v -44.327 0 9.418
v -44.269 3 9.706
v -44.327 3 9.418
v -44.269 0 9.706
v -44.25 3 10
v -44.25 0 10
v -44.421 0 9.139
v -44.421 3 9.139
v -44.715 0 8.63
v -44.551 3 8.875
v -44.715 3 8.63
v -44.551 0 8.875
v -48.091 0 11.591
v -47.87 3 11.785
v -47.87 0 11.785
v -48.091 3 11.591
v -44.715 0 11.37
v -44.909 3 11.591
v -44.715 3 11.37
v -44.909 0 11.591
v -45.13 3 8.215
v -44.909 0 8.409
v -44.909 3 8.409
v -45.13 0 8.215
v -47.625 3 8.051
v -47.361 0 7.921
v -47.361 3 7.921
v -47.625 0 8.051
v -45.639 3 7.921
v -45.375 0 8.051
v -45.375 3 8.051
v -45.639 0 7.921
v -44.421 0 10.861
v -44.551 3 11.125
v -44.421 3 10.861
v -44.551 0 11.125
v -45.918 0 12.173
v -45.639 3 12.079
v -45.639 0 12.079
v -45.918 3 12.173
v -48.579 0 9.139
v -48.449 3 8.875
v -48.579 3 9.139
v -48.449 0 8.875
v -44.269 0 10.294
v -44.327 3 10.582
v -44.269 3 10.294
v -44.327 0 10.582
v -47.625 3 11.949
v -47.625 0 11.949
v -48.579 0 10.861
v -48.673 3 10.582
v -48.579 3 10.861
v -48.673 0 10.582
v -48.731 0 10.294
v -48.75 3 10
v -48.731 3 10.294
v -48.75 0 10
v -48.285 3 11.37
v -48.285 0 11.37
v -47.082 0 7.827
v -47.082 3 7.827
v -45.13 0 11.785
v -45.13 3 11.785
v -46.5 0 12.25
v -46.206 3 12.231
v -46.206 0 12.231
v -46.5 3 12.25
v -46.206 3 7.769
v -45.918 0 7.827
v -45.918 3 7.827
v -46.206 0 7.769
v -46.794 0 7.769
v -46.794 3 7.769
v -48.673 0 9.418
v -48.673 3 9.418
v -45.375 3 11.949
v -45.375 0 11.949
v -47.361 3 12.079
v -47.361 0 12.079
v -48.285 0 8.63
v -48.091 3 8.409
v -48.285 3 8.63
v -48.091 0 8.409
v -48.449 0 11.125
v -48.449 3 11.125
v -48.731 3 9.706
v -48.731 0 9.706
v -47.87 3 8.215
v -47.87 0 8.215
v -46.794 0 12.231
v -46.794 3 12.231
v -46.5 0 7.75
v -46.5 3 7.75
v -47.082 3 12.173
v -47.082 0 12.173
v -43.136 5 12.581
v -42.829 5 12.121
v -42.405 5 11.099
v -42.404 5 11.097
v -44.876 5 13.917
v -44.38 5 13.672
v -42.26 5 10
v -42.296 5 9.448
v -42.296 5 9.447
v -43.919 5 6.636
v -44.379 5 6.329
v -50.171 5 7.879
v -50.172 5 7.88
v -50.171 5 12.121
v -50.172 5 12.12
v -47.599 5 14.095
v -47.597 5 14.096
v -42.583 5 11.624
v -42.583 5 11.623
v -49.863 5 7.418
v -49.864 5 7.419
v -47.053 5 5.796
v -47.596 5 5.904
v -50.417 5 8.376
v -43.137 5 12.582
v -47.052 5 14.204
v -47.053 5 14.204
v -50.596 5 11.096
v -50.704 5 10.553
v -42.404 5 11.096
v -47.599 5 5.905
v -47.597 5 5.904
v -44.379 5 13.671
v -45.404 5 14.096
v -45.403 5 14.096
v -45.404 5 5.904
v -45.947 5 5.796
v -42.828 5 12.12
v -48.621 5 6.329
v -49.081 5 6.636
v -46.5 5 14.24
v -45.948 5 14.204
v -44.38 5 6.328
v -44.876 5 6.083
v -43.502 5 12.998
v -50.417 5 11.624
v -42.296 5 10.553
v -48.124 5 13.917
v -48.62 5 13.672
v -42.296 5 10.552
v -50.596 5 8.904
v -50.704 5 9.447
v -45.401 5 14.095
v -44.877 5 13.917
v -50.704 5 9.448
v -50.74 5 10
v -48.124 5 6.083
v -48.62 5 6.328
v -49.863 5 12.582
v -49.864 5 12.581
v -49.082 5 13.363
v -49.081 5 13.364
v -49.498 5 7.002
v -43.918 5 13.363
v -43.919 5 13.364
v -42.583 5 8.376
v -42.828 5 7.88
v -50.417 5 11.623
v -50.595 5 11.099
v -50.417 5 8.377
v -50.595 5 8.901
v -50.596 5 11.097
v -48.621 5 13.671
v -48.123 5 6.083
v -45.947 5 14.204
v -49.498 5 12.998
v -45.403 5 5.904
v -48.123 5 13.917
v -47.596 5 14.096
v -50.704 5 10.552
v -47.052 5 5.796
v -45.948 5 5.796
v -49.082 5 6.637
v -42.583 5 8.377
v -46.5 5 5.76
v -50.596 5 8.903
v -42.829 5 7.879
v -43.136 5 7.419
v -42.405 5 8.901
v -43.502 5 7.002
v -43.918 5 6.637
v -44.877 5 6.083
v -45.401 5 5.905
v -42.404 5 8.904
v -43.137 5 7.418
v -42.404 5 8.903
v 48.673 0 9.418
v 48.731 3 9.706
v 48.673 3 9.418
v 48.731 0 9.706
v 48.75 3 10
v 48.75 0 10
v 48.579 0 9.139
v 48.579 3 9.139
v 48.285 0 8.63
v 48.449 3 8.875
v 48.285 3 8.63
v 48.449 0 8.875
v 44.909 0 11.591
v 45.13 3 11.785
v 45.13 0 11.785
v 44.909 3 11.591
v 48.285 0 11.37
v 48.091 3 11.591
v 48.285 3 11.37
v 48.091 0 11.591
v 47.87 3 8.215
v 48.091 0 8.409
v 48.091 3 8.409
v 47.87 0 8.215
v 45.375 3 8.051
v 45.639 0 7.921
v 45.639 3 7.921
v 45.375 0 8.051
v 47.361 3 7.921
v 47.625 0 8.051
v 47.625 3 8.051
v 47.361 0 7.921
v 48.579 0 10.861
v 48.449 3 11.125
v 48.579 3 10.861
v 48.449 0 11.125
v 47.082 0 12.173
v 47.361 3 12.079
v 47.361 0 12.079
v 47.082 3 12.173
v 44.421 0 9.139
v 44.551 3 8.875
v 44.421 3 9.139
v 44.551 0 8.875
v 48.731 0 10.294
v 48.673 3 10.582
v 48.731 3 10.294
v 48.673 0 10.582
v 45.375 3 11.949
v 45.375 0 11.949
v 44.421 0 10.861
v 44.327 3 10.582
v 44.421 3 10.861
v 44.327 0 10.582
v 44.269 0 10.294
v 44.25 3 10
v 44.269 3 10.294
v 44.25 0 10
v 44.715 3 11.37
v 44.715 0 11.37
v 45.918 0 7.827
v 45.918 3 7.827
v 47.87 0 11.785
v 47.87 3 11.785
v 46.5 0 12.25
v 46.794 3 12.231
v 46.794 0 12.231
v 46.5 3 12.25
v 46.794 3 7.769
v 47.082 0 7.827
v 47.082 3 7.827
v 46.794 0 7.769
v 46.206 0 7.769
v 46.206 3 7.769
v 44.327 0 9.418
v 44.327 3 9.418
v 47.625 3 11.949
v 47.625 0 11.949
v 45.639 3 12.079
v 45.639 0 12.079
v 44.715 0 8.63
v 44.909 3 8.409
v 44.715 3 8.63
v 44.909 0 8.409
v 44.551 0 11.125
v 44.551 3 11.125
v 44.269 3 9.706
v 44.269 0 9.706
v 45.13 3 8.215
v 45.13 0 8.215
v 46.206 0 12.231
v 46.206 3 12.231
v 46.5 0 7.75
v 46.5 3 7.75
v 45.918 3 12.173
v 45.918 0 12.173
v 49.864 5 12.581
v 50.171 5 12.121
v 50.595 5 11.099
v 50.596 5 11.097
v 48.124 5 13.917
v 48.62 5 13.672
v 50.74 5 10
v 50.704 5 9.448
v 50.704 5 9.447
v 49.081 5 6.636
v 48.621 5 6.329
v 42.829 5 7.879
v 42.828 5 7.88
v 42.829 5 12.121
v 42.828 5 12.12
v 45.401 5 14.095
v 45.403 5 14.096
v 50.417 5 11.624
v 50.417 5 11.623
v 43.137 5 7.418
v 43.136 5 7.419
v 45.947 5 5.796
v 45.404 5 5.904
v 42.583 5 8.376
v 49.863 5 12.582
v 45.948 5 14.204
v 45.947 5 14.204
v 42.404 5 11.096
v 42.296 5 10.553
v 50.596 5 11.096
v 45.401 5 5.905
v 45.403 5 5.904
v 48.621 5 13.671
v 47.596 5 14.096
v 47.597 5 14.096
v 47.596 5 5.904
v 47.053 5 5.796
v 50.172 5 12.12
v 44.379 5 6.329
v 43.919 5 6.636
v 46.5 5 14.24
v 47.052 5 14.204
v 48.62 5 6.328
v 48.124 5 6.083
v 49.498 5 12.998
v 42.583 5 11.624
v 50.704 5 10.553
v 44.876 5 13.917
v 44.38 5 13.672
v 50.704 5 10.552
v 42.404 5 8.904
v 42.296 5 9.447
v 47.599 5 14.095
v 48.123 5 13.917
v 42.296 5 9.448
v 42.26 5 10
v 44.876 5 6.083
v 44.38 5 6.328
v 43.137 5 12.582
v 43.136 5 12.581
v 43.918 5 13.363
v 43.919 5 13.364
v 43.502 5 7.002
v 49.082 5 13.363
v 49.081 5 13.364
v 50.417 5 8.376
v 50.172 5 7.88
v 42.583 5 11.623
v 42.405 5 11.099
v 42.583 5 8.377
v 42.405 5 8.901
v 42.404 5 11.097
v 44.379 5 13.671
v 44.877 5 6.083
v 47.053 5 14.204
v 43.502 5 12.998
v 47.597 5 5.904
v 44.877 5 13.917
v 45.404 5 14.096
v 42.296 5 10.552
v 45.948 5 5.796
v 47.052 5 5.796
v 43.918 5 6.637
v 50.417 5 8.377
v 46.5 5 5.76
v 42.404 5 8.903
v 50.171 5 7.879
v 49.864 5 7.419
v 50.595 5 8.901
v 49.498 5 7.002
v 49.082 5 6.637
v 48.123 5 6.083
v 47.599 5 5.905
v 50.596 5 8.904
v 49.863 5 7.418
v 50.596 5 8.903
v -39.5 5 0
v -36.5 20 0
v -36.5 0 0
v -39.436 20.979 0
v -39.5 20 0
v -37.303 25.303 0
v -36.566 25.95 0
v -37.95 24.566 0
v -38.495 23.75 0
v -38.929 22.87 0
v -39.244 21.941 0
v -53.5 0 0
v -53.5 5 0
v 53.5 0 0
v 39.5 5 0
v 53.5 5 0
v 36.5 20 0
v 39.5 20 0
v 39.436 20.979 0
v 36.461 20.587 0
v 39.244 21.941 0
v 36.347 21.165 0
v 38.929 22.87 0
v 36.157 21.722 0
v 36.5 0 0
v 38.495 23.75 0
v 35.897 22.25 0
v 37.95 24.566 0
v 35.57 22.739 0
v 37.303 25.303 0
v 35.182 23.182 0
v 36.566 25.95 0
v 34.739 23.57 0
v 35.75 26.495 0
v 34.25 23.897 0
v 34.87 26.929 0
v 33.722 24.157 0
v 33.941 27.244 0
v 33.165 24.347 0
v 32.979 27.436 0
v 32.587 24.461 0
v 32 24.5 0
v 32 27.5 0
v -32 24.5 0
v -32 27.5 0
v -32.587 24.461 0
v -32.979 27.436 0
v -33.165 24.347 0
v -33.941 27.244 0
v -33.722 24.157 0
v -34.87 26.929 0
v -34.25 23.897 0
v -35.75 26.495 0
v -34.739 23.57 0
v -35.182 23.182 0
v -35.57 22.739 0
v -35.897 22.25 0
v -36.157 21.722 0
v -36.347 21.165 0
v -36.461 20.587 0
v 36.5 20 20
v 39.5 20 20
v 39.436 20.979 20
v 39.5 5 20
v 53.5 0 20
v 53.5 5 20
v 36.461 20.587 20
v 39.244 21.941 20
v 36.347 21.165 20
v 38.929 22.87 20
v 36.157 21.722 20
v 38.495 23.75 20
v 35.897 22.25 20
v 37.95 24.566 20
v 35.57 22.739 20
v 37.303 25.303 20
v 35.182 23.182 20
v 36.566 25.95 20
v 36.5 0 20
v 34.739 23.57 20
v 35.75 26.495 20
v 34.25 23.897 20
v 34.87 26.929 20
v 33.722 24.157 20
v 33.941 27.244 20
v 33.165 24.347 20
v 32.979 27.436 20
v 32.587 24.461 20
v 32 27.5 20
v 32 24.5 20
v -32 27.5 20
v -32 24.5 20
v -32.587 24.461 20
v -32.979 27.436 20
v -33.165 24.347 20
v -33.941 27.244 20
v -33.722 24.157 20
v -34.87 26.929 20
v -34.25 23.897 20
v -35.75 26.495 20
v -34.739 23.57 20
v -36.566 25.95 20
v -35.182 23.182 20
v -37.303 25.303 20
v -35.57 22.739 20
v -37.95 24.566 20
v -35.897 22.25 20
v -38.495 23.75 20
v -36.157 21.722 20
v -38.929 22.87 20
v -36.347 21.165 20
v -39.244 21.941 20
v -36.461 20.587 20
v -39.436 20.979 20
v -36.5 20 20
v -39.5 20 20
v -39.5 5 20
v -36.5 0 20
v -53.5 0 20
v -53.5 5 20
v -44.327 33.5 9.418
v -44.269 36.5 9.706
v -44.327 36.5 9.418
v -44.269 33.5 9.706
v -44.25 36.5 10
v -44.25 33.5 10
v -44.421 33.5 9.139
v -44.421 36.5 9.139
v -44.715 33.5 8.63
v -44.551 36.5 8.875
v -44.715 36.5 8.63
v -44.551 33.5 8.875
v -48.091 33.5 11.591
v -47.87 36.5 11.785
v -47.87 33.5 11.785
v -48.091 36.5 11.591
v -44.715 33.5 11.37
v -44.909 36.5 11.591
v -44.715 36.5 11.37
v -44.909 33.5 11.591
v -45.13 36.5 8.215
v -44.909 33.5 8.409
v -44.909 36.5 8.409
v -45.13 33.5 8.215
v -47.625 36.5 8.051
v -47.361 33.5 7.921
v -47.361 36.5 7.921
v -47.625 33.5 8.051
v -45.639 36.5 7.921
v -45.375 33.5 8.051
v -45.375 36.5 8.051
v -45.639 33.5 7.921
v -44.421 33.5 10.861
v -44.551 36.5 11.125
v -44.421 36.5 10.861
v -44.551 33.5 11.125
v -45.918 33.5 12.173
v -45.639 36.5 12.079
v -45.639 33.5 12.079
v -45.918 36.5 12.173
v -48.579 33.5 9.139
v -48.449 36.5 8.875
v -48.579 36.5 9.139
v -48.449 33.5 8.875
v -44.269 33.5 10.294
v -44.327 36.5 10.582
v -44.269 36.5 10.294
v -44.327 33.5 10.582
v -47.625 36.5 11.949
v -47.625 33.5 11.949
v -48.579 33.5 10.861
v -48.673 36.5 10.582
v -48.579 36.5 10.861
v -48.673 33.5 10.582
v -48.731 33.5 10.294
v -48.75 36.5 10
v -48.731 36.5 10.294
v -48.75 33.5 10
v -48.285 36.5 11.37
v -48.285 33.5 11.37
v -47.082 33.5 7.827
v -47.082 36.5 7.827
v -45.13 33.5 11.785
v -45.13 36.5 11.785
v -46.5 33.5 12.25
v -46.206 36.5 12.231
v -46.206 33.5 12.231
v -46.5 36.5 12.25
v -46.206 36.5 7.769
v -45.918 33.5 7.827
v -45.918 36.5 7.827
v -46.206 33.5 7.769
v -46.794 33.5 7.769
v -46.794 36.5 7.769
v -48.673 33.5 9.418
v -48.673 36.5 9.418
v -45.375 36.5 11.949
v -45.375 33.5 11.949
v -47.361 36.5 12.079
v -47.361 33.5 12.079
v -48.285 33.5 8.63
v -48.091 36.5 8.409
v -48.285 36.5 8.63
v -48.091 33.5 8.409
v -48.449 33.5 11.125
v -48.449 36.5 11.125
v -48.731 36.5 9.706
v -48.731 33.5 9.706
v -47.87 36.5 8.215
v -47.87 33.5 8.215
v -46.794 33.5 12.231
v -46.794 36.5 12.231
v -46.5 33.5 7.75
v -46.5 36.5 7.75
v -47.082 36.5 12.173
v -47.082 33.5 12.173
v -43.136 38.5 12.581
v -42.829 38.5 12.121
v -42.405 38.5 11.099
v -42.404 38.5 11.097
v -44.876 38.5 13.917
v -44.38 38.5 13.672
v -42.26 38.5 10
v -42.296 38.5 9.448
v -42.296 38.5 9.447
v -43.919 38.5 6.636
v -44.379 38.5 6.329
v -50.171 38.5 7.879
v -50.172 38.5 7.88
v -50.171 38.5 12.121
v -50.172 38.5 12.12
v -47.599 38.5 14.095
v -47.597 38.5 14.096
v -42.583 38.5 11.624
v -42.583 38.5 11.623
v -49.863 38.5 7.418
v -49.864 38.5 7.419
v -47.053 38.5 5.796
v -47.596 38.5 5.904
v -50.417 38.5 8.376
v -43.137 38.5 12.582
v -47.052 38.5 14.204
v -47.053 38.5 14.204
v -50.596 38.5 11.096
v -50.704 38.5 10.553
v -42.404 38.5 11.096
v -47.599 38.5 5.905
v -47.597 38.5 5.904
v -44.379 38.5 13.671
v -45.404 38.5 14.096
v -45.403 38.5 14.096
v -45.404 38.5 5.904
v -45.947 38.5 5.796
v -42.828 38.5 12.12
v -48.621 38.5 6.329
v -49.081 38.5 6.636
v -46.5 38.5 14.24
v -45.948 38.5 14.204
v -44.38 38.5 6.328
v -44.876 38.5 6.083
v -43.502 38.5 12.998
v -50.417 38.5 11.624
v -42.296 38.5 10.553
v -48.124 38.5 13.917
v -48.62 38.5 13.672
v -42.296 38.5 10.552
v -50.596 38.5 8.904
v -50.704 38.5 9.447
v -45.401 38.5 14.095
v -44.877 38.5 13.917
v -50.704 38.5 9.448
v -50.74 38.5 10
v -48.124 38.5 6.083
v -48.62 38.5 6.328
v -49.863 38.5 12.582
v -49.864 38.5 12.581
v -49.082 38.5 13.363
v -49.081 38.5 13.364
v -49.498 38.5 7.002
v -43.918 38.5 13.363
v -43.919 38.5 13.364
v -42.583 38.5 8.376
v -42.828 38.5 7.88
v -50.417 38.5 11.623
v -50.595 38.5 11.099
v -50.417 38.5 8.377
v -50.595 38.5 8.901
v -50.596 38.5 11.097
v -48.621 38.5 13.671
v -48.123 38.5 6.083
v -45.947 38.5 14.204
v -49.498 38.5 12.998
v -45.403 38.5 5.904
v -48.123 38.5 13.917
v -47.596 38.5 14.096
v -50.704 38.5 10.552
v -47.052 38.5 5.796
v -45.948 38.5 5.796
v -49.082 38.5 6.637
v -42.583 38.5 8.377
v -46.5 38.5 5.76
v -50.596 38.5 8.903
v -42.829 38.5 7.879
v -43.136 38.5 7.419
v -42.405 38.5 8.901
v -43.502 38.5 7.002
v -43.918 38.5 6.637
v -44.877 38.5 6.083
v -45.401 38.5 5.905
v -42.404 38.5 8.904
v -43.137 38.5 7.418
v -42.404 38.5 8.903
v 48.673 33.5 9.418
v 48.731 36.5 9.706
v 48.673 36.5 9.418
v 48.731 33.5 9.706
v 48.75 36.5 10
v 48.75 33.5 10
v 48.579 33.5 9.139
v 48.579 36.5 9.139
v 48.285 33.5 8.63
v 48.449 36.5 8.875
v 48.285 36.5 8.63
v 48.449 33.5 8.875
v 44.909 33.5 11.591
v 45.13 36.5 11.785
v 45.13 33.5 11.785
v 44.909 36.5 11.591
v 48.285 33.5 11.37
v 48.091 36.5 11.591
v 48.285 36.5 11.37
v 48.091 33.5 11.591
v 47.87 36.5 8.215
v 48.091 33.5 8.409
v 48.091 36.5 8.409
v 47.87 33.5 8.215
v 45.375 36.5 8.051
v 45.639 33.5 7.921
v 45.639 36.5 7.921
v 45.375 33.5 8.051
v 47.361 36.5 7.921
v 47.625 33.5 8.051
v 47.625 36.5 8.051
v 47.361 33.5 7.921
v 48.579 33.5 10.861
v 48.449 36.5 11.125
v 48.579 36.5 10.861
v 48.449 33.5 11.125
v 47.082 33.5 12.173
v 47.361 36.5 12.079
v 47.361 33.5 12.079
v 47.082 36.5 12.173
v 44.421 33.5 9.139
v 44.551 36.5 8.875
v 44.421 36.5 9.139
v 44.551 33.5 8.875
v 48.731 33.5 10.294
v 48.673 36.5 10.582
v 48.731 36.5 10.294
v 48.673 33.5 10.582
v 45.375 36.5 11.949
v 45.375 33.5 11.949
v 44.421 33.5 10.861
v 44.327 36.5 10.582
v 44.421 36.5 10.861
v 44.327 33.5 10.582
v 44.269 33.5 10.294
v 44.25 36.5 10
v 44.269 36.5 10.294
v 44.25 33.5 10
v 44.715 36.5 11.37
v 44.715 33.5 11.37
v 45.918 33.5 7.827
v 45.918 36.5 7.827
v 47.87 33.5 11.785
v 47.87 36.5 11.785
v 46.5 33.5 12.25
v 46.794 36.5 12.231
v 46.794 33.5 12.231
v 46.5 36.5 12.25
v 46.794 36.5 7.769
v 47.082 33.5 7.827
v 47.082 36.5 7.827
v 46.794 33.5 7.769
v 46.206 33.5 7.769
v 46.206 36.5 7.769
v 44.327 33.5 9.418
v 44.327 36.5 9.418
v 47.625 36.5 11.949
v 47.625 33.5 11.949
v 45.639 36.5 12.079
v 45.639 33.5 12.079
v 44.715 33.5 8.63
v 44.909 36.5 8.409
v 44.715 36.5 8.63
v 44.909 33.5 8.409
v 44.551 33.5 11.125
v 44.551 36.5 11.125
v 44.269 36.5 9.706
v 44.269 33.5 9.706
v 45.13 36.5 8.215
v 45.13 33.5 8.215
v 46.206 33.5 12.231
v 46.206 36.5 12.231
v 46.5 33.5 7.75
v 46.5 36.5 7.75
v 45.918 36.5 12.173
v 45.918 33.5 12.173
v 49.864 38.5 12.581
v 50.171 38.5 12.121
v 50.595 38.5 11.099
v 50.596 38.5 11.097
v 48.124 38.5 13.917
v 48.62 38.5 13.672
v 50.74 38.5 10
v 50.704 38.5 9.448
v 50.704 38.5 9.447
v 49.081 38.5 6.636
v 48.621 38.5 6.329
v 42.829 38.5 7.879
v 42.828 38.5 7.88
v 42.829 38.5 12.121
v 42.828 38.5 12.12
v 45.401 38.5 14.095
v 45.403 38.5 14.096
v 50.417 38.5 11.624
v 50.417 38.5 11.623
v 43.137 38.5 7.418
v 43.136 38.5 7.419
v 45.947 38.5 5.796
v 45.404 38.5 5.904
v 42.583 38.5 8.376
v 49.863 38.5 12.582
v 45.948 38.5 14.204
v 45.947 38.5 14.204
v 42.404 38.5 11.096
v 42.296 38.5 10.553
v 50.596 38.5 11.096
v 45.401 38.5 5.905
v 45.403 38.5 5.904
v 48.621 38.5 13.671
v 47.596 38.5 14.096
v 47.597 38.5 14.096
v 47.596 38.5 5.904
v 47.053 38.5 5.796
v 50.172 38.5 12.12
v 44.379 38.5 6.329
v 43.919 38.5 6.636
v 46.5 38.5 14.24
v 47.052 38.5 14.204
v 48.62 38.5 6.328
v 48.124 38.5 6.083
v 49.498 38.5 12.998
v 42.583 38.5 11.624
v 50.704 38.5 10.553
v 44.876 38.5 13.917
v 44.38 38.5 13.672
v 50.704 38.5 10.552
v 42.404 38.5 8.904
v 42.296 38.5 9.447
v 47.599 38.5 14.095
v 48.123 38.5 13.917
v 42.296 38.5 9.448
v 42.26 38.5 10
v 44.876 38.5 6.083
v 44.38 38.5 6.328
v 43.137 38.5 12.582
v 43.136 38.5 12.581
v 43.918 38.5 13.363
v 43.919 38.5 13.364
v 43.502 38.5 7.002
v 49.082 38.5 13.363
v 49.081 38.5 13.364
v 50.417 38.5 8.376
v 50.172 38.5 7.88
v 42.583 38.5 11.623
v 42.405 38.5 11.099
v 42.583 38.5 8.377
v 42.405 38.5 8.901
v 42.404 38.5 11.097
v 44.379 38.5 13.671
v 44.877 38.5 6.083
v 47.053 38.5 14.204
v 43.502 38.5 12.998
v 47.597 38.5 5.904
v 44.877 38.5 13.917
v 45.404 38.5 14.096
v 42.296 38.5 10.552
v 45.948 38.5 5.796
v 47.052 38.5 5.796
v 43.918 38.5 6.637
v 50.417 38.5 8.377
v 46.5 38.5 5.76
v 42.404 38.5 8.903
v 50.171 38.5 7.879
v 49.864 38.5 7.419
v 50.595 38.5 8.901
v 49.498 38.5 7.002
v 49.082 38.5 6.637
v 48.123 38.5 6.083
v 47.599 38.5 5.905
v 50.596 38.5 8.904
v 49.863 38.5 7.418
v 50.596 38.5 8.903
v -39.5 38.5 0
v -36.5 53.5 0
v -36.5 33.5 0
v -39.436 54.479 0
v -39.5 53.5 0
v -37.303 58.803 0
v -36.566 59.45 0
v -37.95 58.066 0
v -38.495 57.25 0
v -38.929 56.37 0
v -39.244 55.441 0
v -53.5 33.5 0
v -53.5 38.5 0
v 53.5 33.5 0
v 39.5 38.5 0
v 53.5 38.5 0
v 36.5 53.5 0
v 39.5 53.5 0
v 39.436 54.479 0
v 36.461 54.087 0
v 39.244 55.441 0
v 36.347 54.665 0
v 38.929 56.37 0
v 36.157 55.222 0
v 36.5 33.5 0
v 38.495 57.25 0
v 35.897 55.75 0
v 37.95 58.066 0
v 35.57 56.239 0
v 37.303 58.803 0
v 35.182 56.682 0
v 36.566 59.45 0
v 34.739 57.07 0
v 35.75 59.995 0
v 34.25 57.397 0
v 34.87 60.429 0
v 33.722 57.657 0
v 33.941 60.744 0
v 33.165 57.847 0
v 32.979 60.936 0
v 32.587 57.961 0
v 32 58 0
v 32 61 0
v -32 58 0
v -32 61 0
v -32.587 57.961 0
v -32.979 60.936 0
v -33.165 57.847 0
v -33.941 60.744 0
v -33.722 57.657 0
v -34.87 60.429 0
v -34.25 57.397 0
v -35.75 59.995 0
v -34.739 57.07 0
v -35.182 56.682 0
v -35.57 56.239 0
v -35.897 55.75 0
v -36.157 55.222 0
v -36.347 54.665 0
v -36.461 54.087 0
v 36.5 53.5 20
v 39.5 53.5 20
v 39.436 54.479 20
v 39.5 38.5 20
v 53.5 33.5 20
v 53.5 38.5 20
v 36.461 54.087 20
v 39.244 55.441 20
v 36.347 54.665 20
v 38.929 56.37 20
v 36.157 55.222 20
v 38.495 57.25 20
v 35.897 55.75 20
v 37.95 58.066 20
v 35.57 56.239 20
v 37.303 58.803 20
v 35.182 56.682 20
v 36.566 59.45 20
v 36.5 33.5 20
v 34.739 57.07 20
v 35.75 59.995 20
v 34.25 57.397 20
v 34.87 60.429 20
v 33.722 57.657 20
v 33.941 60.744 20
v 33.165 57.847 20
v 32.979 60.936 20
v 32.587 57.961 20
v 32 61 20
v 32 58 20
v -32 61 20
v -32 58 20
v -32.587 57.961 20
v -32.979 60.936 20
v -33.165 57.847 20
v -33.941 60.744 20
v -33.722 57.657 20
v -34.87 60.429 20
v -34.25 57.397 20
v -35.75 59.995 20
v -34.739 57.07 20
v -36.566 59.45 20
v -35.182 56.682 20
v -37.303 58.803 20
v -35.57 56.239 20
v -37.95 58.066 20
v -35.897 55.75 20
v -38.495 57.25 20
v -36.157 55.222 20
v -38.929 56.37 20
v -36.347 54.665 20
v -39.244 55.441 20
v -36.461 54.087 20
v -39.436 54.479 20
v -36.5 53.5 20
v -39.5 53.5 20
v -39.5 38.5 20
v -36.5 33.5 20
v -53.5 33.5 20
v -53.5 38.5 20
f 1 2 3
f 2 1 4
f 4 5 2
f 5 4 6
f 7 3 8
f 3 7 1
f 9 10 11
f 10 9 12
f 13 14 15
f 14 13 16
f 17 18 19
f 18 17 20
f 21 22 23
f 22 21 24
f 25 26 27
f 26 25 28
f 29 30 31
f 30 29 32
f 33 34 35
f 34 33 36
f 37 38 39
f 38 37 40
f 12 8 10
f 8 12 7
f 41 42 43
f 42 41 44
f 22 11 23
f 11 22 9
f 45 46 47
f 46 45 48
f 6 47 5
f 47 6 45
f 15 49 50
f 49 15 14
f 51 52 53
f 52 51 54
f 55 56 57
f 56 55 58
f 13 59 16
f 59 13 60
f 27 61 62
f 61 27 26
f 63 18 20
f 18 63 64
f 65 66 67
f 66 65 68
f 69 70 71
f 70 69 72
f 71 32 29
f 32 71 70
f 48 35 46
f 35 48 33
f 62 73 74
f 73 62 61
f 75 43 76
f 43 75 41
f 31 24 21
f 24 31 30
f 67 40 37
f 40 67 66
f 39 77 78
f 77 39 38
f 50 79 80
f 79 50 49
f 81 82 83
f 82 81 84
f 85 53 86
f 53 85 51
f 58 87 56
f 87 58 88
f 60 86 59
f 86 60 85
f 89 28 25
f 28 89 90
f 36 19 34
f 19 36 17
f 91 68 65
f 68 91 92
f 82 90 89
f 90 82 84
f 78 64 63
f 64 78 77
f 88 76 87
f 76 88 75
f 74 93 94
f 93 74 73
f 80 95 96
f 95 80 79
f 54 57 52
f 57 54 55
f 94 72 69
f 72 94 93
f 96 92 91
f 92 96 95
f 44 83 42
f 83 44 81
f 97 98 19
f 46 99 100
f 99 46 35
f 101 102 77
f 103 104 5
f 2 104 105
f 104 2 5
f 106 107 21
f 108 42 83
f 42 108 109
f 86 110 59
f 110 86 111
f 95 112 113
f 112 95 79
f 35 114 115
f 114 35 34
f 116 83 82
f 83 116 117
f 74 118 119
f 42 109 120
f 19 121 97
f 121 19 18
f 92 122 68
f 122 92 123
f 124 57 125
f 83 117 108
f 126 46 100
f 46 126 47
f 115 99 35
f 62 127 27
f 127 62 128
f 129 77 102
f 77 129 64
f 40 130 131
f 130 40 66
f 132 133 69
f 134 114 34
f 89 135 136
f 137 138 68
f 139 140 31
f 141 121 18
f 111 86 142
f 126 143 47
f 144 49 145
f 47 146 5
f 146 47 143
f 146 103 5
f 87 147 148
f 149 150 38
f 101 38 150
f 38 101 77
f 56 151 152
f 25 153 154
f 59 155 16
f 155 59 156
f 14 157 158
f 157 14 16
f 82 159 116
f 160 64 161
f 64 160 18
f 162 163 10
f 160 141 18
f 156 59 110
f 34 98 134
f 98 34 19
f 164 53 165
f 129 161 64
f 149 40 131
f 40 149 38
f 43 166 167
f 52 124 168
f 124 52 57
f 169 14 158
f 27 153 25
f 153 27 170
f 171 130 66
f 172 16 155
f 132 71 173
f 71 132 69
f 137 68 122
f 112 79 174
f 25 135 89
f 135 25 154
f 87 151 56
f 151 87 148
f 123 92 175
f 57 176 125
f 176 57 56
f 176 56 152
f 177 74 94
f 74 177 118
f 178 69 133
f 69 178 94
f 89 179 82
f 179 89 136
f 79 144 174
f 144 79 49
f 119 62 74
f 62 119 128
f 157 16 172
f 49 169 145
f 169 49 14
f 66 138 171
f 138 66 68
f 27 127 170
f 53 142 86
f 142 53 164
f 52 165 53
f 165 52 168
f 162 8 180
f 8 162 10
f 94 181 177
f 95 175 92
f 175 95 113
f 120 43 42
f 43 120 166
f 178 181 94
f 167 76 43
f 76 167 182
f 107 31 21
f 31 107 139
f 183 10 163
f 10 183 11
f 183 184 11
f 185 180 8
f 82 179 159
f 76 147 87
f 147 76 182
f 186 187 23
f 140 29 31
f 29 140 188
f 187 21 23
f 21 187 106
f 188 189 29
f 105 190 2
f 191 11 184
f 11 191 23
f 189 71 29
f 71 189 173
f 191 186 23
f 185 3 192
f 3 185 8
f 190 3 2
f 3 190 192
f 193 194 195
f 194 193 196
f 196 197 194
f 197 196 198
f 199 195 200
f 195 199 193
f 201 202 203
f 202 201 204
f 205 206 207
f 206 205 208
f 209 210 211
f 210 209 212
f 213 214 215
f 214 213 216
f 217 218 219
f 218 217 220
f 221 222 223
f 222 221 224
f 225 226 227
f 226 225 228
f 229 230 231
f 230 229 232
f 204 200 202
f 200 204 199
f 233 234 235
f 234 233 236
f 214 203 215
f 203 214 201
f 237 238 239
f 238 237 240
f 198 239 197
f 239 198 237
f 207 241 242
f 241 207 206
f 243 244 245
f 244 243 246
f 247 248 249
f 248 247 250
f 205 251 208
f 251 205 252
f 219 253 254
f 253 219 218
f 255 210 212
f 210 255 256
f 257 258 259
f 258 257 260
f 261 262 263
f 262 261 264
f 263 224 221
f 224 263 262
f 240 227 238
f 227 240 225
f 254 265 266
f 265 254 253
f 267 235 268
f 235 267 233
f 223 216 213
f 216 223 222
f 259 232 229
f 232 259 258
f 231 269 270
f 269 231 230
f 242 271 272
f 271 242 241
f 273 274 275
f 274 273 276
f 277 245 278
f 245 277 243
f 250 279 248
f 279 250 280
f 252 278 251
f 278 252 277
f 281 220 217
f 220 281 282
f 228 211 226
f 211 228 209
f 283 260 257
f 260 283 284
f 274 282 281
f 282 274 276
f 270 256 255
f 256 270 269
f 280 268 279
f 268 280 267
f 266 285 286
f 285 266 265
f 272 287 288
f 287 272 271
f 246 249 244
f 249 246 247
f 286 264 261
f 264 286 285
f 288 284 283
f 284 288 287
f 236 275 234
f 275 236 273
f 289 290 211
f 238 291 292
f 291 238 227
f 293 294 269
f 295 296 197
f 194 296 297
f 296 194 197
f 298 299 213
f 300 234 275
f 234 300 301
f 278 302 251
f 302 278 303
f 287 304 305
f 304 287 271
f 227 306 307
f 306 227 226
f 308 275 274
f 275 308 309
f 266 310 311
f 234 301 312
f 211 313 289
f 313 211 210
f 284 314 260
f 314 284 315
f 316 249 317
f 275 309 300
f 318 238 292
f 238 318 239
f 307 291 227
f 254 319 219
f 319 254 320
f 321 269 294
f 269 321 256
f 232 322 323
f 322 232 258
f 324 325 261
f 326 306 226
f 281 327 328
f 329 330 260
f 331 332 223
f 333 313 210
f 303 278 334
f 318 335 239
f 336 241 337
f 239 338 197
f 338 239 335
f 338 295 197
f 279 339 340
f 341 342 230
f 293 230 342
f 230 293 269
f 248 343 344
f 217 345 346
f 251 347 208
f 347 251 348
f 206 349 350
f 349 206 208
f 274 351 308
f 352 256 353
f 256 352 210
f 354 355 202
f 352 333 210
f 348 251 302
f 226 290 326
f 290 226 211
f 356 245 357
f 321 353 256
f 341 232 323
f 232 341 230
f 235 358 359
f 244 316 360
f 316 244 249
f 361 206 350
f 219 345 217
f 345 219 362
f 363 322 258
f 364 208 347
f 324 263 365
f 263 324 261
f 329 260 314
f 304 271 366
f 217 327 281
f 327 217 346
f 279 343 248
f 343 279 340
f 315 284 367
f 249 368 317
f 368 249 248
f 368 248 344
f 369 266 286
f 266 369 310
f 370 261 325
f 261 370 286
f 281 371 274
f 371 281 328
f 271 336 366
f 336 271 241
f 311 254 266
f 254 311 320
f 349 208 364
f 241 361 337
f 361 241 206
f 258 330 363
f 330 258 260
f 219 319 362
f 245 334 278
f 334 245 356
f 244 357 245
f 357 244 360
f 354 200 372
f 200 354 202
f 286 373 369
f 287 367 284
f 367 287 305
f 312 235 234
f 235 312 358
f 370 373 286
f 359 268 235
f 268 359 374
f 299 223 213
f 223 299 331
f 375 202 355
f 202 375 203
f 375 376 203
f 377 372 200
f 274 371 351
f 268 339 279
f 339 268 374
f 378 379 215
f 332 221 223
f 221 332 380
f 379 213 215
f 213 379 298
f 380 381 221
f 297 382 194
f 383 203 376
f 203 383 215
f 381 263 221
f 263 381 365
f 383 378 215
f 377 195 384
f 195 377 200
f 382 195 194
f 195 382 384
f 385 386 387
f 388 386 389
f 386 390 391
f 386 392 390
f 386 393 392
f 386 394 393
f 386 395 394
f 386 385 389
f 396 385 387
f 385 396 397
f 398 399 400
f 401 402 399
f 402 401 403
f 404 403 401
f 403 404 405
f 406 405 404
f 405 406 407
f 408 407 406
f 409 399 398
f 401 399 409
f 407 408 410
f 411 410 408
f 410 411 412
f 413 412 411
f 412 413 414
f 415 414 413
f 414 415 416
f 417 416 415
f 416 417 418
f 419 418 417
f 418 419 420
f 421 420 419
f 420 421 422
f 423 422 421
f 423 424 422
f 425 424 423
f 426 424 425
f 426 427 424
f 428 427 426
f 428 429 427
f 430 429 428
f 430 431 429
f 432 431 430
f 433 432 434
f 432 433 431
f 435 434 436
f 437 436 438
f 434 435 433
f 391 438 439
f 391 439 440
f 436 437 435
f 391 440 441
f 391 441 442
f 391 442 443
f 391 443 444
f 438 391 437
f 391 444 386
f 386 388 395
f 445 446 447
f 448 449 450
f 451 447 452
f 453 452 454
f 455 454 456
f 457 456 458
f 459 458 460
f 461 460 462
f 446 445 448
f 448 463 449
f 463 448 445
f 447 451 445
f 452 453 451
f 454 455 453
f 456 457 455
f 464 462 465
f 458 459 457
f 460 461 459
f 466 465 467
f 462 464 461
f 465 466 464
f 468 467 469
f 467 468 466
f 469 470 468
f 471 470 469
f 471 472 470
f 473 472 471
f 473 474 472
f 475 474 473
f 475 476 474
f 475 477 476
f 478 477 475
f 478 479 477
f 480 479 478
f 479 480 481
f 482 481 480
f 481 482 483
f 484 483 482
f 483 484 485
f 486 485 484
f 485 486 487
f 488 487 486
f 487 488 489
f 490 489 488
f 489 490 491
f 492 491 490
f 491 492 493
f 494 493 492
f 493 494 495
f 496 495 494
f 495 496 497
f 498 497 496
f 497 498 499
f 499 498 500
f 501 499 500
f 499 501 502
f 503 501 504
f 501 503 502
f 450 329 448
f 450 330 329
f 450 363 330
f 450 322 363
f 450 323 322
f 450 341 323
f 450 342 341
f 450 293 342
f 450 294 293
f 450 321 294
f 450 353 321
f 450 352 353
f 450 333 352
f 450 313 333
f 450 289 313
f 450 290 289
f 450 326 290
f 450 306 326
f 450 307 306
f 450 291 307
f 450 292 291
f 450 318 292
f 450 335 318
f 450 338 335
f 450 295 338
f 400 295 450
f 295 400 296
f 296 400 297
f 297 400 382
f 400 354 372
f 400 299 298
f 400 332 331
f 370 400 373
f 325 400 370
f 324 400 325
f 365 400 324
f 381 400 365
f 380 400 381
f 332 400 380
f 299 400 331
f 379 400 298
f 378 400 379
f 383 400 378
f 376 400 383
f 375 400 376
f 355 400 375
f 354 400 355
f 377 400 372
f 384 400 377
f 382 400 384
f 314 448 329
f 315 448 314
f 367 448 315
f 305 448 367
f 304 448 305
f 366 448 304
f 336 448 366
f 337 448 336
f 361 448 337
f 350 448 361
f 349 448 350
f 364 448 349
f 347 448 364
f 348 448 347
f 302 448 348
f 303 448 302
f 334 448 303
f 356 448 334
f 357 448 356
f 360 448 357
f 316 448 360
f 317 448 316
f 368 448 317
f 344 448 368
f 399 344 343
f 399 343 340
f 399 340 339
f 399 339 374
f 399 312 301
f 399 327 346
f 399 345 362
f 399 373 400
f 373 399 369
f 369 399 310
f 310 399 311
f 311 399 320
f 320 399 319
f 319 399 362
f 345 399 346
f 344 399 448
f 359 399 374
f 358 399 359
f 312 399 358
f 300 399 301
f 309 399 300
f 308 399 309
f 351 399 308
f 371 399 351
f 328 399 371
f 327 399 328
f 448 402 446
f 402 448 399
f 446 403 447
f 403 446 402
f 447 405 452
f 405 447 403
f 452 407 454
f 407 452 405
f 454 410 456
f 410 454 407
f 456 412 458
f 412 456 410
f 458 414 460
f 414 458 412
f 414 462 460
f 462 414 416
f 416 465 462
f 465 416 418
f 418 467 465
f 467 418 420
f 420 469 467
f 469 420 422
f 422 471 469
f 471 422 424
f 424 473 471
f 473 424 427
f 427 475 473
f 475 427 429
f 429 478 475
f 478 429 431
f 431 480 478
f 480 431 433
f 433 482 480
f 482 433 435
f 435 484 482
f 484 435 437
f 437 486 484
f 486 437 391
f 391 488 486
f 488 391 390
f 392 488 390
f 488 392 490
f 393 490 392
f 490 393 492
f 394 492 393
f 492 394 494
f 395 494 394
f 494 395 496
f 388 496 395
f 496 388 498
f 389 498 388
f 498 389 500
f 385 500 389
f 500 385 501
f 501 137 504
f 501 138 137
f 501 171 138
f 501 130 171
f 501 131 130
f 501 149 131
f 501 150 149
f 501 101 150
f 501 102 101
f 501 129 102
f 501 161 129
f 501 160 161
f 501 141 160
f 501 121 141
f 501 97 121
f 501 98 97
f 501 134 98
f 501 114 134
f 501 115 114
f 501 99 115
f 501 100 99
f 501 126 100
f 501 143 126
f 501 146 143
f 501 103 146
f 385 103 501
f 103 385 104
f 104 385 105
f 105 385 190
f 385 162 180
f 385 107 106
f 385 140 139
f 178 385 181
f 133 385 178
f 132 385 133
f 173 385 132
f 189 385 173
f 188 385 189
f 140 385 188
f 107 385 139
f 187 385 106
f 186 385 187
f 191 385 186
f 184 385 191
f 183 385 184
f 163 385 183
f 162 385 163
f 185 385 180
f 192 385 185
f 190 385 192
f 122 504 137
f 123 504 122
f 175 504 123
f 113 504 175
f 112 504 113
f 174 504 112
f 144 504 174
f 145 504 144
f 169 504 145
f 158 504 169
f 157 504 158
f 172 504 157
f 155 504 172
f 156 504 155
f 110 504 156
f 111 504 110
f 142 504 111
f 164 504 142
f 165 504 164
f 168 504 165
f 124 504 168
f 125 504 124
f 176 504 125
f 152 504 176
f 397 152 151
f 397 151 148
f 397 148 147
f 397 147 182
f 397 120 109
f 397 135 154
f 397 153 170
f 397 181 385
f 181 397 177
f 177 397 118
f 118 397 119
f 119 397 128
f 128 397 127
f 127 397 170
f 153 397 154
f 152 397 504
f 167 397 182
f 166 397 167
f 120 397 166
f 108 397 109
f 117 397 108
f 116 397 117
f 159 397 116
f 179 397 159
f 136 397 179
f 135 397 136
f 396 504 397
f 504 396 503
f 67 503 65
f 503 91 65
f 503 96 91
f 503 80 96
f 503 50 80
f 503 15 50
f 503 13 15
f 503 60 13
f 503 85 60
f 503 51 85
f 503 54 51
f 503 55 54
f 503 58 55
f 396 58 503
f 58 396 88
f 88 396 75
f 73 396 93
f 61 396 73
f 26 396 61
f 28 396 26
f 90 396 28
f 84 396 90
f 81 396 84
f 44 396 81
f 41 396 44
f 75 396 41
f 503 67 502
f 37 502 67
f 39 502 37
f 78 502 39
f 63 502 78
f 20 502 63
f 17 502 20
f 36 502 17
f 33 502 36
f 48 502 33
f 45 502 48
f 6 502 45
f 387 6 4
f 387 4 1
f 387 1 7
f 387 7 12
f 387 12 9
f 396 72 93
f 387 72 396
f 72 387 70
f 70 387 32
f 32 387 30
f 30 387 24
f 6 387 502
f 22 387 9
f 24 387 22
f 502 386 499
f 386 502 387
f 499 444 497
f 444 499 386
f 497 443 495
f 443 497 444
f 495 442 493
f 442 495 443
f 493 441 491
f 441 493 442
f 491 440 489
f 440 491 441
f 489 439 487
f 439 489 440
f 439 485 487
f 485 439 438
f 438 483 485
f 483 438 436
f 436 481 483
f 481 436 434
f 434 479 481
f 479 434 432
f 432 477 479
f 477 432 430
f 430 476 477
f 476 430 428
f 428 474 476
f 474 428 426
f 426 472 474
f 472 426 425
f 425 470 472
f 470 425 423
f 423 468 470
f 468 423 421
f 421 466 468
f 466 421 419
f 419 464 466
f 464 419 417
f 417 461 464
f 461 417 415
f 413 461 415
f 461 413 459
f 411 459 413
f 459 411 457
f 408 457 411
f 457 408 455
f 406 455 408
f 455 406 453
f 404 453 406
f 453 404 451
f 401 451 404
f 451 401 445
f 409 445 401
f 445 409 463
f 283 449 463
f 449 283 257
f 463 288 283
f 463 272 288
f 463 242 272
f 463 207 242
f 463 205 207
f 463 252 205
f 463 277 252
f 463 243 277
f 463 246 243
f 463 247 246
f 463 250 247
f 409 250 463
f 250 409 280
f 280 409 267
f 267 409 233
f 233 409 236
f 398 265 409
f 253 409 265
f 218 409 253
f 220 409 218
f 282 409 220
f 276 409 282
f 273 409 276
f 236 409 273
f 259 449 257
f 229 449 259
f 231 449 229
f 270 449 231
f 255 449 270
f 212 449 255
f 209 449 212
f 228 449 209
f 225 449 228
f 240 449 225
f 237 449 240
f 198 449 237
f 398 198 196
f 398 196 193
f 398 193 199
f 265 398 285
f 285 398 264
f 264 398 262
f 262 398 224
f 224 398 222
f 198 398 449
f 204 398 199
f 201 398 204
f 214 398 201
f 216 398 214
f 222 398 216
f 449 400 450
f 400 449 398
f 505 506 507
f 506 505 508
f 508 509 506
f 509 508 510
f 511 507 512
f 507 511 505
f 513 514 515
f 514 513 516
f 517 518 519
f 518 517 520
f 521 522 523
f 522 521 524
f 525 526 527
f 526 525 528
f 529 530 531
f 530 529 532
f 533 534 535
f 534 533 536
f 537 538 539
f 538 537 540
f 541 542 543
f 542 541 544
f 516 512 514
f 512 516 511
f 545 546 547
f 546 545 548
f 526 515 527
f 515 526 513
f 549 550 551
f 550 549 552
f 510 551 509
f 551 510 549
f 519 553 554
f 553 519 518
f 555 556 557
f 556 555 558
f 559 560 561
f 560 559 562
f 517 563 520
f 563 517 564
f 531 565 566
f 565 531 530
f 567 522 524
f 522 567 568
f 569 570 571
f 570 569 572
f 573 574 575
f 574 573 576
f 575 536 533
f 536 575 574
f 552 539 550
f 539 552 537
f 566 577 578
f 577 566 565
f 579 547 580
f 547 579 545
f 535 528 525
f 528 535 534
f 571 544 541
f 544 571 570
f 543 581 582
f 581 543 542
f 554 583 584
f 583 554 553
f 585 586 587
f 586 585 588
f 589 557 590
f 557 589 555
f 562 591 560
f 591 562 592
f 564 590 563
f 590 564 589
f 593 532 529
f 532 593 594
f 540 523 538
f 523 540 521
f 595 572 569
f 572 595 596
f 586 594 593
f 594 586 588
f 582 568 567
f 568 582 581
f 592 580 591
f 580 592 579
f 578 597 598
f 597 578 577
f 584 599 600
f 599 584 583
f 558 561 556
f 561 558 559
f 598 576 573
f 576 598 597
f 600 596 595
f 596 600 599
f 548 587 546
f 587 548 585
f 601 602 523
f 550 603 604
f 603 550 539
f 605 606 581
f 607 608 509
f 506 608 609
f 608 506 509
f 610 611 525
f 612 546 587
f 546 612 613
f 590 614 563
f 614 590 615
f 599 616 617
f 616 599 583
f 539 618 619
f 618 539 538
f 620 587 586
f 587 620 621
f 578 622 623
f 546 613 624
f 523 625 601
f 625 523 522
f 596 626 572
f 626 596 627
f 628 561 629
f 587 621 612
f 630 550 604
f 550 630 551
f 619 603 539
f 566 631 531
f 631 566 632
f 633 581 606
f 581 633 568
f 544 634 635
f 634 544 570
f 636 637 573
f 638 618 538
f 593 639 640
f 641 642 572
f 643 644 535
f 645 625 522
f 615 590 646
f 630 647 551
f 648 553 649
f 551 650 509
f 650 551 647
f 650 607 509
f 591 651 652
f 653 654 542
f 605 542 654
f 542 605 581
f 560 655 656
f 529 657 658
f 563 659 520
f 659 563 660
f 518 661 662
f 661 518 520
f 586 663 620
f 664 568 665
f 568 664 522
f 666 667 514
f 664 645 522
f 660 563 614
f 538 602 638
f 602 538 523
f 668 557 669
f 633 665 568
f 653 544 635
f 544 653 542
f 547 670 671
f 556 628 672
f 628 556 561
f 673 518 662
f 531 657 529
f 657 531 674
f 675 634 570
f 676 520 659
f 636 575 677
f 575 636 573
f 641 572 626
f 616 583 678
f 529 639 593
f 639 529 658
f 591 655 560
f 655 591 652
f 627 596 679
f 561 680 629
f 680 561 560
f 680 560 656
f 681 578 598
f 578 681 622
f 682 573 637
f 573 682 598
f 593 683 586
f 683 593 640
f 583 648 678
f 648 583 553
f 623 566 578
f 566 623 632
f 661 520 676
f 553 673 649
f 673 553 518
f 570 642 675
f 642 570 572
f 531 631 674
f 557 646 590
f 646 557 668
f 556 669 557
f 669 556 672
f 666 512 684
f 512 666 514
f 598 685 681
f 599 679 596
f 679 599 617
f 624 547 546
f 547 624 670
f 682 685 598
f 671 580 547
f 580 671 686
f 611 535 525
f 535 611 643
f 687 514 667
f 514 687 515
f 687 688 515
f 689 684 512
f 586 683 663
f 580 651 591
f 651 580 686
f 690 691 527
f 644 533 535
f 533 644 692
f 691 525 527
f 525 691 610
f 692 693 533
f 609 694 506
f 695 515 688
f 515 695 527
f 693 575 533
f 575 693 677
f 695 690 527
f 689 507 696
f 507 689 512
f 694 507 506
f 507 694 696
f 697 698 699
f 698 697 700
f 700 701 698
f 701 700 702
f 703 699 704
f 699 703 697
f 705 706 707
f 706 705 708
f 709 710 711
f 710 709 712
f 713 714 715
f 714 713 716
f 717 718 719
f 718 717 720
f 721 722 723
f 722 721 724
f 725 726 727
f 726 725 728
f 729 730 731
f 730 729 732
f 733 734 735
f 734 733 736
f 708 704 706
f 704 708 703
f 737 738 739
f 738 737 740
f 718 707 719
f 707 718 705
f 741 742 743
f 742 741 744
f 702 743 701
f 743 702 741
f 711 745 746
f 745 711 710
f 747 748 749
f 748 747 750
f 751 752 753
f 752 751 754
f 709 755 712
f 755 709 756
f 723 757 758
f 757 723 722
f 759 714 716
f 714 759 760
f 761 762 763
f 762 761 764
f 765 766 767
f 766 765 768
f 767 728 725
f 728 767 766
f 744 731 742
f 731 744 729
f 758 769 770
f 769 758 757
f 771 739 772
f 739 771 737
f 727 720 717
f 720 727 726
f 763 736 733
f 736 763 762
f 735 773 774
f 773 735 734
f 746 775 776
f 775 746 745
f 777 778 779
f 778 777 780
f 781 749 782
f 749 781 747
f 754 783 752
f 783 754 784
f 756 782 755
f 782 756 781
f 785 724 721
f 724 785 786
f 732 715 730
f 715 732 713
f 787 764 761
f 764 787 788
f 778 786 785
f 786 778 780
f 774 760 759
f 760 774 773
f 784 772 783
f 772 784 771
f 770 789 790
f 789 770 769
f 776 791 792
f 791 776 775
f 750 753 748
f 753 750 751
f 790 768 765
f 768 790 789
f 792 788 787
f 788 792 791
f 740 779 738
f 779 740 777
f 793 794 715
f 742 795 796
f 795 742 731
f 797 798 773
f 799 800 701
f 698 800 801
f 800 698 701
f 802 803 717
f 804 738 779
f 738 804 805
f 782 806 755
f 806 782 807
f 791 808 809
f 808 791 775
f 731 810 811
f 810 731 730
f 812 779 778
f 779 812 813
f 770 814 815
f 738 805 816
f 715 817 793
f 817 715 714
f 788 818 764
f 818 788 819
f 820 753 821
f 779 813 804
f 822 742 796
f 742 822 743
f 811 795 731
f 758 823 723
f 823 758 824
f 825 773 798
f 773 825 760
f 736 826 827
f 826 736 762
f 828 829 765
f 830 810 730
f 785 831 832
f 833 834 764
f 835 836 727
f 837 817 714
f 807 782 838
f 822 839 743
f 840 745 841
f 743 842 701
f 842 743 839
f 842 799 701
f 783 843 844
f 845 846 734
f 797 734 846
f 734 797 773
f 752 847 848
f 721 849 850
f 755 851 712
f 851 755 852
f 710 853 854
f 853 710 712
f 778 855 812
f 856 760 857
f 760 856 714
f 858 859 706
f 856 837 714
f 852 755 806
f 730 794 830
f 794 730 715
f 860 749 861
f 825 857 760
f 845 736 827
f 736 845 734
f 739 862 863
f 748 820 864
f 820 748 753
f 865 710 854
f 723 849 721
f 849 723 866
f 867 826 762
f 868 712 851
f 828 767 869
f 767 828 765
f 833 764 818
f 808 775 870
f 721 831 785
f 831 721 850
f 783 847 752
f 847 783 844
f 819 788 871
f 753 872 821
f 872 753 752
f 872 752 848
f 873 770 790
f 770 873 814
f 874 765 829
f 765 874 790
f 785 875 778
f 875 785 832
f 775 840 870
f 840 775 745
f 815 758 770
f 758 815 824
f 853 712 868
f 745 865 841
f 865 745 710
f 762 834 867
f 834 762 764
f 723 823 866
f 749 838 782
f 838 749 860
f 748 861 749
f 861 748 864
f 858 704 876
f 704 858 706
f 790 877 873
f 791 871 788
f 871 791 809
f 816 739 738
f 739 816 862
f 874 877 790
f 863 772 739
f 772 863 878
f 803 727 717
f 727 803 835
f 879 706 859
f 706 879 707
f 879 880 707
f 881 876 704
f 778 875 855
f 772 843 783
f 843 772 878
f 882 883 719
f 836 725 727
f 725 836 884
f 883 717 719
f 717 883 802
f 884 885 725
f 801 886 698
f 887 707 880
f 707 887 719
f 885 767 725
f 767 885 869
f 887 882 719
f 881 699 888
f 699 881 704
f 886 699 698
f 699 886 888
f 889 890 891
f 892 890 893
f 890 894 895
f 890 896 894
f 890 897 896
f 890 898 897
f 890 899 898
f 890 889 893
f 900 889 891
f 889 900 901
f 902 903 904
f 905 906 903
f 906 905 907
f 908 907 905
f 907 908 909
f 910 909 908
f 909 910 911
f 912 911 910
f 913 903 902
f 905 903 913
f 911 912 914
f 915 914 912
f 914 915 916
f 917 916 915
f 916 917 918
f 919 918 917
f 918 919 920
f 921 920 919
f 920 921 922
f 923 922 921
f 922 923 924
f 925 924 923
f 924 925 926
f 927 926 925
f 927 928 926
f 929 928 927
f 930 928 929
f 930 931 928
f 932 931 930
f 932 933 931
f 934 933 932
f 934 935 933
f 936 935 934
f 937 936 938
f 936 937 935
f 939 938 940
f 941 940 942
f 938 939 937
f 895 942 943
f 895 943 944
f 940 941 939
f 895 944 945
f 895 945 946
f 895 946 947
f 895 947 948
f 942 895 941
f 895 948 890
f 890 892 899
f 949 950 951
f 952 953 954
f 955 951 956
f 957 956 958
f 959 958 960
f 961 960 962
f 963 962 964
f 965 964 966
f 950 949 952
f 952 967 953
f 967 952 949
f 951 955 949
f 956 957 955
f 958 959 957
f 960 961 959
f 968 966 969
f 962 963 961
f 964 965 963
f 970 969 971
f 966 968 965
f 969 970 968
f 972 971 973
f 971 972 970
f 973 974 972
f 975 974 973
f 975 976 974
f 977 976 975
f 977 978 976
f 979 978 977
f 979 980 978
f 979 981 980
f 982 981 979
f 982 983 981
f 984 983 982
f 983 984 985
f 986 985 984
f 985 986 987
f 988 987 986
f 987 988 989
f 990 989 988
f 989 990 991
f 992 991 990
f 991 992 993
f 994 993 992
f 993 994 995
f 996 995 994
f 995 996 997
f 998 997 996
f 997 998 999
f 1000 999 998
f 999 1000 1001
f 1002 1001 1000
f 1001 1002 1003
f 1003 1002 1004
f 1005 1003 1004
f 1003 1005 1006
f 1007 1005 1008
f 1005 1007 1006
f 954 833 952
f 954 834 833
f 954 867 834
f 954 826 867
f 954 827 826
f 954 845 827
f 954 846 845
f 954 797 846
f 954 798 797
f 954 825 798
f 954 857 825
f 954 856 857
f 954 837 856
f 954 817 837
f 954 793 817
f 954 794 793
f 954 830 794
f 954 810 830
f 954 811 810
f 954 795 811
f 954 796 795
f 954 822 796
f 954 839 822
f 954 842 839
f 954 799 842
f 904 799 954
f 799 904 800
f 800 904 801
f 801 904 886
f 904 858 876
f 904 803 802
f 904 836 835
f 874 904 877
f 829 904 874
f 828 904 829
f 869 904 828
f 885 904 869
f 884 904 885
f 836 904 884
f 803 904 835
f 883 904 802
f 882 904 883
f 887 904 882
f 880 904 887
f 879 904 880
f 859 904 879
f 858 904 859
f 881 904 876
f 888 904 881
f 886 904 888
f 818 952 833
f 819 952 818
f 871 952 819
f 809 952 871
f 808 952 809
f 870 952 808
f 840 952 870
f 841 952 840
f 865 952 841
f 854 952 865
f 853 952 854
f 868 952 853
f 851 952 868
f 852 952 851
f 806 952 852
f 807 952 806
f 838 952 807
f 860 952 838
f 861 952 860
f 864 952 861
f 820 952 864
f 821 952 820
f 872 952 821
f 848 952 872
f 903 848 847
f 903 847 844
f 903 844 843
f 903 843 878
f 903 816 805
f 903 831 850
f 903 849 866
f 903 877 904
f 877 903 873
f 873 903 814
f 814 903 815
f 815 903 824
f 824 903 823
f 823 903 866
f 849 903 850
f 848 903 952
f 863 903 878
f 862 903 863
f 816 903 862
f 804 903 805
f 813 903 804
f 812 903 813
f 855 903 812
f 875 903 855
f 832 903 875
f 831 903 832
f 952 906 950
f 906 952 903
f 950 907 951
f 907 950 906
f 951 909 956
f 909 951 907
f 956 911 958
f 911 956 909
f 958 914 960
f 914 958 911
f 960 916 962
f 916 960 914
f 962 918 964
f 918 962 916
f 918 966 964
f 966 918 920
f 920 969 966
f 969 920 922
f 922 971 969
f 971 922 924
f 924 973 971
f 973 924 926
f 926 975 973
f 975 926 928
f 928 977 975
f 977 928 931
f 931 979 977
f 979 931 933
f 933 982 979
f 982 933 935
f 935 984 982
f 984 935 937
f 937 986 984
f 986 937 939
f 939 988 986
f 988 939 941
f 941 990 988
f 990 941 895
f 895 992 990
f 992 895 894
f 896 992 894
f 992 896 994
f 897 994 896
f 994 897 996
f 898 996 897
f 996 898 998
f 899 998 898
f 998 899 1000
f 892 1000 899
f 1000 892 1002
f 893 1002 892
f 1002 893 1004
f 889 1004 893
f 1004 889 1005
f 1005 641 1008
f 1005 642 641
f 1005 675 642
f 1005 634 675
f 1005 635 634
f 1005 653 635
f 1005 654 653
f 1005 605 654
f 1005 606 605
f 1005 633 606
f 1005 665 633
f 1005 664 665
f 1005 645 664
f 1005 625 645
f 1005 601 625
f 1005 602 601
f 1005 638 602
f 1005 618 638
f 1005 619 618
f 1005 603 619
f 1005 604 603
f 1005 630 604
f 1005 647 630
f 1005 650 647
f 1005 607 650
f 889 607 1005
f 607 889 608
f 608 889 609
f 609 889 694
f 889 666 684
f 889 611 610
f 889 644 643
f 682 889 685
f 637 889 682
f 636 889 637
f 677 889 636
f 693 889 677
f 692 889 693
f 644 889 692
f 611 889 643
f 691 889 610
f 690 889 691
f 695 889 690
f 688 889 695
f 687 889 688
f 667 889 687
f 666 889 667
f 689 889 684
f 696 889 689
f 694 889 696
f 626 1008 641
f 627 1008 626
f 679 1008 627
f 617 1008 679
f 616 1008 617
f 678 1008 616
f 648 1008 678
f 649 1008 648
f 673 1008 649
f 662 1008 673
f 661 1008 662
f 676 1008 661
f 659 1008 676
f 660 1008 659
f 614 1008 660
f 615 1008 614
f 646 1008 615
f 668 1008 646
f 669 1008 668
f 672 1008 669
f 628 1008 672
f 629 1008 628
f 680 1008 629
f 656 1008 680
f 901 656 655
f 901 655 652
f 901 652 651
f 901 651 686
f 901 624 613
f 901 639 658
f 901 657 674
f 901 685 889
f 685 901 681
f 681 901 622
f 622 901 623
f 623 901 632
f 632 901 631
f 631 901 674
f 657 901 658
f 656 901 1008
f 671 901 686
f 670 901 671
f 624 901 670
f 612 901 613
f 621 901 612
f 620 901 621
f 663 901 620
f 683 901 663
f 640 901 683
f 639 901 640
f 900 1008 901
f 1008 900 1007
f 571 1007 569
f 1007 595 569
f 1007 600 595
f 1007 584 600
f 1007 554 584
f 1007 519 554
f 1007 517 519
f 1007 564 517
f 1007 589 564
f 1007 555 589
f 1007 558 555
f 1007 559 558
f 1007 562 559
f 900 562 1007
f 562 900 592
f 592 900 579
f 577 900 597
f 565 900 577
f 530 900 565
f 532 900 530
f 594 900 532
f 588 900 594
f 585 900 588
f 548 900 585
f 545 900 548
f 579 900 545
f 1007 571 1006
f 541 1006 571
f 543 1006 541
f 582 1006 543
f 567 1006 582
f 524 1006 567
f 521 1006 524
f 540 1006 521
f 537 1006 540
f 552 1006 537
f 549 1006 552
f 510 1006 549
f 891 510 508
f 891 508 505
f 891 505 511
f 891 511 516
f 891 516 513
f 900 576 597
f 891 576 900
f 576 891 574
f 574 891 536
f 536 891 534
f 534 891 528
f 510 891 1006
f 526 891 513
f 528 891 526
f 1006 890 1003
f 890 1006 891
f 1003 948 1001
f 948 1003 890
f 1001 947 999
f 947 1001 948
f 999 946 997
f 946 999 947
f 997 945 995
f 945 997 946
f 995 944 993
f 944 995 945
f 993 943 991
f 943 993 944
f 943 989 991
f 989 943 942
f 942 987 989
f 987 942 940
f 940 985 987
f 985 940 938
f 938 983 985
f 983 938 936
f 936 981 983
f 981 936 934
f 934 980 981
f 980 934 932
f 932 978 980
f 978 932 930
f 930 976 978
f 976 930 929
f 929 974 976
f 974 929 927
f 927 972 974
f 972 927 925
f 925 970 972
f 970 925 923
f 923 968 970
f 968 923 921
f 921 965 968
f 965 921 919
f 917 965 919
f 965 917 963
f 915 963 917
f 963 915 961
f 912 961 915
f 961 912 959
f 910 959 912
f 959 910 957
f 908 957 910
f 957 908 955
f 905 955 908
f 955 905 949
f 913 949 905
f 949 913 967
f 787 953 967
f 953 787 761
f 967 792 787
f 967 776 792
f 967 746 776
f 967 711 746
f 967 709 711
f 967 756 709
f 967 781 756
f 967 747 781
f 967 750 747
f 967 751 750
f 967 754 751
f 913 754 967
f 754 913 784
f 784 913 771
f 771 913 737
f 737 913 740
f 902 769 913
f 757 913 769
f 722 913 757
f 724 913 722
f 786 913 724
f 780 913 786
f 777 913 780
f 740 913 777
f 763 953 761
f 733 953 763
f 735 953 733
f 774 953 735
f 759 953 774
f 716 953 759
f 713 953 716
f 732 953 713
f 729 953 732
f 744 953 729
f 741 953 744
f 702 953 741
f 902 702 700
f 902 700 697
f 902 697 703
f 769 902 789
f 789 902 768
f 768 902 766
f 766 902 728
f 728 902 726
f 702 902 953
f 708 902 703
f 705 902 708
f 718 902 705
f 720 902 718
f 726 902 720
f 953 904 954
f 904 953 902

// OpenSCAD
// Lenovo 135W AC Adapter Clamp Mount (ADL135NLC3A / 45N0365 / PA-1131-72)
//
// A screw-down saddle clamp that holds the power brick flat against a
// surface — under a desk, on a wall, or inside a cabinet. Each clamp is a
// U-shaped strap that wraps over the brick, with a flange on each side
// carrying a countersunk screw hole. Use two clamps per brick, one near each
// end; the straps are narrow so both cables exit freely.
//
// The strap's inner height is slightly LESS than the brick's thickness
// (`squeeze`), so driving the screws flexes the strap and clamps the brick
// tight instead of letting it rattle.
//
// DATUM: origin at the mounting surface, centred on the brick's width.
//   X = across the brick width, Y = out from the mounting surface,
//   Z = along the brick length (the strap width).
//
// PRINT ORIENTATION: as modelled — the strap profile lies flat on the bed and
// is extruded upward by `strap_width`. Layer lines follow the U so the bends
// are strong; no supports needed (the screw holes are small horizontal bores).
// PETG recommended: the brick runs warm.

/* [Adapter Dimensions] */
// Adapter width — across the brick (measure yours with calipers)
adapter_width = 72; // [40:0.5:120]
// Adapter thickness — how far it stands off the mounting surface
adapter_thickness = 25; // [15:0.5:50]
// Radius of the adapter's rounded long edges
adapter_edge_radius = 4; // [0:0.5:10]

/* [Fit] */
// Side clearance between the strap and the brick, per side
clearance = 0.5; // [0:0.25:2]
// Interference on thickness so tightening the screws clamps the brick
squeeze = 0.5; // [0:0.25:2]

/* [Strap] */
// Strap width (along the brick's length)
strap_width = 20; // [10:1:40]
// Strap wall thickness
strap_thickness = 3; // [2:0.5:6]
// Number of clamps to lay out on the build plate
clamp_count = 2; // [1:1:4]
// Gap between clamps on the build plate
plate_gap = 6; // [2:1:20]

/* [Mounting Flanges] */
// How far each flange extends beyond the strap wall
flange_length = 14; // [8:1:30]
// Flange thickness (screw clamping length)
flange_thickness = 5; // [3:0.5:10]
// Screw shank hole diameter (4.5 suits #8 / M4 wood screws)
screw_hole = 4.5; // [2.5:0.5:6]
// Screw head diameter for the countersink (0 for a plain hole)
screw_head = 8.5; // [0:0.5:14]

/* [Rendering] */
$fa = 2;
$fn = 48;

/* [Hidden] */
eps = 0.01;

// ---- Derived profile dimensions ----
inner_w = adapter_width + 2 * clearance;      // cavity width
inner_h = adapter_thickness - squeeze;        // cavity height off the surface
inner_r = min(adapter_edge_radius + clearance, inner_w / 2, inner_h);
outer_w = inner_w + 2 * strap_thickness;
outer_h = inner_h + strap_thickness;
outer_r = inner_r + strap_thickness;
total_w = outer_w + 2 * flange_length;        // overall clamp span in X
csk_depth = screw_head > screw_hole ? (screw_head - screw_hole) / 2 : 0;
// Screw hole centre, measured outward from the strap's outer wall.
screw_offset = flange_length / 2;
screw_x = outer_w / 2 + screw_offset;

echo(str("Clamp span ", total_w, "mm, height ", outer_h, "mm, width ", strap_width, "mm"));
echo(str("Screw centres ", 2 * screw_x, "mm apart"));
assert(squeeze < adapter_thickness / 4, "squeeze is unreasonably large");
assert(screw_head == 0 || screw_head > screw_hole, "screw head must exceed the shank");
assert(csk_depth < flange_thickness - 1, "countersink leaves no flange material");
assert(screw_head < flange_length, "screw head would hit the strap wall");

// ============================================================
// Helpers
// ============================================================

// 2D "tombstone": a rectangle from y = 0 up to h, centred on x = 0, with
// its two TOP corners rounded to r.
module top_rounded_rect(w, h, r) {
    rr = max(min(r, w / 2, h), eps);
    hull() {
        for (x = [-w / 2 + rr, w / 2 - rr])
            translate([x, h - rr]) circle(r = rr);
        translate([-w / 2, 0]) square([w, h - rr]);
    }
}

// ============================================================
// Components
// ============================================================

// The clamp cross-section (XY): U-strap + two flanges, open at the surface.
module clamp_profile() {
    difference() {
        union() {
            top_rounded_rect(outer_w, outer_h, outer_r);
            translate([-total_w / 2, 0]) square([total_w, flange_thickness]);
        }
        translate([0, -eps]) top_rounded_rect(inner_w, inner_h + eps, inner_r);
    }
}

// Countersunk screw bore through a flange, running along Y. The countersink
// opens away from the mounting surface so the head sits flush.
module screw_cut() {
    rotate([-90, 0, 0]) {
        translate([0, 0, -eps])
            cylinder(h = flange_thickness + 2 * eps, d = screw_hole);
        if (csk_depth > 0)
            translate([0, 0, flange_thickness - csk_depth])
                cylinder(h = csk_depth + eps, d1 = screw_hole, d2 = screw_head);
    }
}

module clamp() {
    difference() {
        linear_extrude(height = strap_width) clamp_profile();
        for (sx = [-screw_x, screw_x])
            translate([sx, 0, strap_width / 2]) screw_cut();
    }
}

// ============================================================
// Assembly — clamps laid out side by side for printing
// ============================================================
module clamp_set() {
    pitch = outer_h + plate_gap;
    for (i = [0 : clamp_count - 1])
        translate([0, i * pitch, 0]) clamp();
}

// Guard: skip rendering when included by another file (e.g. tests).
if (is_undef(RENDER_CLAMP) ? true : RENDER_CLAMP) {
    clamp_set();
}
